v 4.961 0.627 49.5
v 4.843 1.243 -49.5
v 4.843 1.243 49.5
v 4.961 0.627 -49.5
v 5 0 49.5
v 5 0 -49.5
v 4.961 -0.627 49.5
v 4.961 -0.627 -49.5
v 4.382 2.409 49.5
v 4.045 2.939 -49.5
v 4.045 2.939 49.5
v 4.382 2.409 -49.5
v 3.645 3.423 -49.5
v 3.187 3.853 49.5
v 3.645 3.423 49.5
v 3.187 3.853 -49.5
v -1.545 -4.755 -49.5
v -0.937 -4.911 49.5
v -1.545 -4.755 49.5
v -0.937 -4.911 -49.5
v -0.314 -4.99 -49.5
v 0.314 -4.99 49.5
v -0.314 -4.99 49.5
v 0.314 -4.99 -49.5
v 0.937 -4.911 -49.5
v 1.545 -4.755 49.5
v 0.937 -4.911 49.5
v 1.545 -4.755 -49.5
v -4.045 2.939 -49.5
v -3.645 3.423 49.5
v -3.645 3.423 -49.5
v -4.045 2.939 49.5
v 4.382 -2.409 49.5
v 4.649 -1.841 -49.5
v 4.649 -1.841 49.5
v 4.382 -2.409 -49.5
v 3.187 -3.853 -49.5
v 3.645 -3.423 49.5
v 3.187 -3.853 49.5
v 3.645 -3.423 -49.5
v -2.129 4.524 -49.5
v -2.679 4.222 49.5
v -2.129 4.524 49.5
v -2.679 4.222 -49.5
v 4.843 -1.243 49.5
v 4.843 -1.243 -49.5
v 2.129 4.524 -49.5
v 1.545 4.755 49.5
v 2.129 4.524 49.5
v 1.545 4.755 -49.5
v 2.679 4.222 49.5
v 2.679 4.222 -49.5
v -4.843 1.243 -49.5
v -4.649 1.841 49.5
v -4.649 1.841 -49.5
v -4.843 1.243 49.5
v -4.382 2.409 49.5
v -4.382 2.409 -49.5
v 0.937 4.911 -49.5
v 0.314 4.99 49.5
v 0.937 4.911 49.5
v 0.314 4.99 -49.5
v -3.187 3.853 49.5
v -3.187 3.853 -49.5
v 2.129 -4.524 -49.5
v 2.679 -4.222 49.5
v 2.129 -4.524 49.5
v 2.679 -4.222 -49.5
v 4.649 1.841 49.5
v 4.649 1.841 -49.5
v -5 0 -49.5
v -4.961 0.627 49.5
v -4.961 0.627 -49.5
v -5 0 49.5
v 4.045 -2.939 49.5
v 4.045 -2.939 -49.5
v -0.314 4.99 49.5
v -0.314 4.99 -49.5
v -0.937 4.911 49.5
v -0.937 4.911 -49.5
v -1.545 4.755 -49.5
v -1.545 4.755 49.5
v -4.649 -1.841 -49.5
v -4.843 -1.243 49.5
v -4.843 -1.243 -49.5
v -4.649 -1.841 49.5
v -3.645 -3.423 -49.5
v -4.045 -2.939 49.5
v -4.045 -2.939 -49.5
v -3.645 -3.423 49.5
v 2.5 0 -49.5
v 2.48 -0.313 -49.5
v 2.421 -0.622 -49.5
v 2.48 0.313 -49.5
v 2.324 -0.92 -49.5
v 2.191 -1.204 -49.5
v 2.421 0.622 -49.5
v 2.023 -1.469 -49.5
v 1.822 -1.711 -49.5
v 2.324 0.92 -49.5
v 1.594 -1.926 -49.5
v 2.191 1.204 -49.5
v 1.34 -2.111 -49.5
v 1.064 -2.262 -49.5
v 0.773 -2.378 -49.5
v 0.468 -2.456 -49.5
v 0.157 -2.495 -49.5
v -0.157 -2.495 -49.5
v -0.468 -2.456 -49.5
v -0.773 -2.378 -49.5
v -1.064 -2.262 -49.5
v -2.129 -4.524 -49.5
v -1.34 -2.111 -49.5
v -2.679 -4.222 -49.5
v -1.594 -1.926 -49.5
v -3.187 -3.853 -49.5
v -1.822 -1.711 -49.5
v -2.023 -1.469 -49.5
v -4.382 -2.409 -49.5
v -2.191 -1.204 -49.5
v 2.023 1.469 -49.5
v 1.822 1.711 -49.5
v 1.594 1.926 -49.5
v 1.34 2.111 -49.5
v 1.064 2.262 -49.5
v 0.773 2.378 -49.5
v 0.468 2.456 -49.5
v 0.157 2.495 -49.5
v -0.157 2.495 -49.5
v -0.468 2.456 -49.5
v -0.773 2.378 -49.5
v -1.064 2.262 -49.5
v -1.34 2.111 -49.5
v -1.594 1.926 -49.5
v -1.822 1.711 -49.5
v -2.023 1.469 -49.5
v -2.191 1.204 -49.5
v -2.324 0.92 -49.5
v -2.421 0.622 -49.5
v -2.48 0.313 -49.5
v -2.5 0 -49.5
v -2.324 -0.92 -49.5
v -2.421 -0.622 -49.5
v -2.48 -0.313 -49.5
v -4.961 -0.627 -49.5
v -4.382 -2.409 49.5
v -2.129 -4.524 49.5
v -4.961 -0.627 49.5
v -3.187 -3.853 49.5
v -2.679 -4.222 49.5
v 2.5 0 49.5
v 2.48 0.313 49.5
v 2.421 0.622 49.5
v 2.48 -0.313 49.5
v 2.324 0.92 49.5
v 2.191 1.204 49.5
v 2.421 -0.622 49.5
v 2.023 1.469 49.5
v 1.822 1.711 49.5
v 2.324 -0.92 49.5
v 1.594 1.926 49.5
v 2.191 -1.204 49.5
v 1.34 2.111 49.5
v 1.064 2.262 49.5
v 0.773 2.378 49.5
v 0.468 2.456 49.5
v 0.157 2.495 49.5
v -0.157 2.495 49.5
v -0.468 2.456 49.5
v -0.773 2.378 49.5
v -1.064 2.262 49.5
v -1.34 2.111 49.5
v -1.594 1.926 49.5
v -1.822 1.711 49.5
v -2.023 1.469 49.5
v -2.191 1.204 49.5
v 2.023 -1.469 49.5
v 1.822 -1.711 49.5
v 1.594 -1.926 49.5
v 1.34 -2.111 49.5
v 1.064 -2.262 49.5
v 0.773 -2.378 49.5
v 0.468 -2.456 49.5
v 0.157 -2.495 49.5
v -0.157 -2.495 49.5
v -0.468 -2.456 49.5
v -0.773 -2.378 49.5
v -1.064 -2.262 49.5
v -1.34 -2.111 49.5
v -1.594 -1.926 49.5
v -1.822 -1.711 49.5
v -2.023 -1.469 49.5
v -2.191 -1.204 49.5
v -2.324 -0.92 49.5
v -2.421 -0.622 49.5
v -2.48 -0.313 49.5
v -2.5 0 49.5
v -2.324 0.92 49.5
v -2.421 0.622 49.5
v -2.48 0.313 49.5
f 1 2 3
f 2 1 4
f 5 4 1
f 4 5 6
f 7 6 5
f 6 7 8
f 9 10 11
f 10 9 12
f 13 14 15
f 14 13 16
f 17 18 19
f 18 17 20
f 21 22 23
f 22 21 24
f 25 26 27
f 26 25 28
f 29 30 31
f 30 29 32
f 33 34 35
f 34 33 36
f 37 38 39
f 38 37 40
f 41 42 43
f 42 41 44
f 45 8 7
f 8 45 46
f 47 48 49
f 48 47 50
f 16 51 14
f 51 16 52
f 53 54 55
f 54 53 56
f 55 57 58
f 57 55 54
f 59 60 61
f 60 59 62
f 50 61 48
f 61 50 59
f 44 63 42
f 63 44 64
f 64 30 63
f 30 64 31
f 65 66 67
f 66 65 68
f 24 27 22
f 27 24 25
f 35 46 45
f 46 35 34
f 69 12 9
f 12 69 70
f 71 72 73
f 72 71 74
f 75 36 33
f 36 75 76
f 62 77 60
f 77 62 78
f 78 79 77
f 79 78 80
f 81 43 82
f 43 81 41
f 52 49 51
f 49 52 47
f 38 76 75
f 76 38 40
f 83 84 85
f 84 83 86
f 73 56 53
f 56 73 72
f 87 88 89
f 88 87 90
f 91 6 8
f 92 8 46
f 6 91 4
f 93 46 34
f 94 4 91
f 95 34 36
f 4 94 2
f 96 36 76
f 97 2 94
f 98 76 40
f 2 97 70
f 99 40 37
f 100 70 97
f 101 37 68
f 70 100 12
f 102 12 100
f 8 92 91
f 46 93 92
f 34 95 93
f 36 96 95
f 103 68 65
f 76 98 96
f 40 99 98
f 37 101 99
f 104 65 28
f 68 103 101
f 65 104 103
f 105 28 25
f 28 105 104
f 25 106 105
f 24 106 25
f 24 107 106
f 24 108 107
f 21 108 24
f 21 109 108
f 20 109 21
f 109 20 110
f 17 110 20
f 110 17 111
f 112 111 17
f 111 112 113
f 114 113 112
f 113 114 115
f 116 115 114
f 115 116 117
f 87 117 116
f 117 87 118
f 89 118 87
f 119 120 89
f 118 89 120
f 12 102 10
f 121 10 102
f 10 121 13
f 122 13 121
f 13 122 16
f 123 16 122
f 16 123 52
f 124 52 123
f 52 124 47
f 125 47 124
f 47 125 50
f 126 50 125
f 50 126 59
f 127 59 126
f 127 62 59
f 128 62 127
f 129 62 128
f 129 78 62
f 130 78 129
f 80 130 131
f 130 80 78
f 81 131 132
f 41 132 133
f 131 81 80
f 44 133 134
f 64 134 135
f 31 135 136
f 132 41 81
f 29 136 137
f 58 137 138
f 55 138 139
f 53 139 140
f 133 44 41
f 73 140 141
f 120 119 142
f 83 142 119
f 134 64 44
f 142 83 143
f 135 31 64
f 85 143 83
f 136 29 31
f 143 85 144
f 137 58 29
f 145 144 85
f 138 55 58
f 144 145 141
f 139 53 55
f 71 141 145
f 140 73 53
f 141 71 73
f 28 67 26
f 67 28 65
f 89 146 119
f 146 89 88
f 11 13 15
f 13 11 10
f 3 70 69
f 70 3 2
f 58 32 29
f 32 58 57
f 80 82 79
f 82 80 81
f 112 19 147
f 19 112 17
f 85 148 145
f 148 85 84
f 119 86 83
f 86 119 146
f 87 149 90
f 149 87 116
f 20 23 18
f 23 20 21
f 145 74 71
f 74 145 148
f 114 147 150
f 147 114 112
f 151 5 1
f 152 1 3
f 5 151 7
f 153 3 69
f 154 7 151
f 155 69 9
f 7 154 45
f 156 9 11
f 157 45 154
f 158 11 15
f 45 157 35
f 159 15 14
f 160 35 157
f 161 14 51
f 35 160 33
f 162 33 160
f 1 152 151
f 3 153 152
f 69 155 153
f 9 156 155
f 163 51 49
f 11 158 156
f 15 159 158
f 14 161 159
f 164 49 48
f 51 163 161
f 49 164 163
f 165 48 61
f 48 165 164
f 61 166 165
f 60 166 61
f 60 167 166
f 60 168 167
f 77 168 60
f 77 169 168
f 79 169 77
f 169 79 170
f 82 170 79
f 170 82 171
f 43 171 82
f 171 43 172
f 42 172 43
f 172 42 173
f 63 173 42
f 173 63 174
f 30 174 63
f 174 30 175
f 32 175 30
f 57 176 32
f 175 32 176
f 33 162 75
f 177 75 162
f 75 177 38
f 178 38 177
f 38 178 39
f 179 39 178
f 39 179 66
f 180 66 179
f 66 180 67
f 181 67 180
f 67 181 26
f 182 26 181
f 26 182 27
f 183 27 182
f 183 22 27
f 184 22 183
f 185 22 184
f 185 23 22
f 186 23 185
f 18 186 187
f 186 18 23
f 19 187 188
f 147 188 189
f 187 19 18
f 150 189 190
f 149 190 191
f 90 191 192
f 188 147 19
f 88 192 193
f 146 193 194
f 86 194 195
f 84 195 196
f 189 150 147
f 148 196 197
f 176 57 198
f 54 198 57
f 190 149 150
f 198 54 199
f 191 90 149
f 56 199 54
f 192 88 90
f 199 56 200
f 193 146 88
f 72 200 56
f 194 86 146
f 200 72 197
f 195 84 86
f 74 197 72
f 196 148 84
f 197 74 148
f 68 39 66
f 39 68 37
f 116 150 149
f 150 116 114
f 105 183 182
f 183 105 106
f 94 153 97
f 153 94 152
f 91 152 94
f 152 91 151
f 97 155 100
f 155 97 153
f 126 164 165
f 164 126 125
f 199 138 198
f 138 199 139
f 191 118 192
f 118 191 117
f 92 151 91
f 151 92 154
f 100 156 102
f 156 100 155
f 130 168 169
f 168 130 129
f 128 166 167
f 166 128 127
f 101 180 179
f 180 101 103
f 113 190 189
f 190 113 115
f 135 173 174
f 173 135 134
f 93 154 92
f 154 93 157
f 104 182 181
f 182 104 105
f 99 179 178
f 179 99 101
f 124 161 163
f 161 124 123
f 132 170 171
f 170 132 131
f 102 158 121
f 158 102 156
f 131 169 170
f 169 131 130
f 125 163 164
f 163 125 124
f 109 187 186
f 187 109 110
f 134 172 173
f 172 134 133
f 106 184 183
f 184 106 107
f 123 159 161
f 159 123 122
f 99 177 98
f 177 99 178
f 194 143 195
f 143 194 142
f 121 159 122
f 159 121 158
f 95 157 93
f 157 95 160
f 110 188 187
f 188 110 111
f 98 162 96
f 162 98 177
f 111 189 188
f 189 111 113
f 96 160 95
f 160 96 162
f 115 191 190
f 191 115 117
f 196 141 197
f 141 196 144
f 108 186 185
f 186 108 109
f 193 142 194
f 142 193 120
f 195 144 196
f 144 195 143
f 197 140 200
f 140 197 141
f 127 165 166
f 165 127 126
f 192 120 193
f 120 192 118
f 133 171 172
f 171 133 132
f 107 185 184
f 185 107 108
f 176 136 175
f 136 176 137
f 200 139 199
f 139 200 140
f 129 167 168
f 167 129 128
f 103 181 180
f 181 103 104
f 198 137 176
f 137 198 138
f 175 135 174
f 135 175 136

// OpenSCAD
$fn = 50;


difference() {
	union() {
		translate(v = [0, 0, -49.5000000000]) {
			cylinder(h = 99, r = 5.0000000000);
		}
	}
	union() {
		translate(v = [0, 0, -100.0000000000]) {
			cylinder(h = 200, r = 2.5000000000);
		}
	}
}
